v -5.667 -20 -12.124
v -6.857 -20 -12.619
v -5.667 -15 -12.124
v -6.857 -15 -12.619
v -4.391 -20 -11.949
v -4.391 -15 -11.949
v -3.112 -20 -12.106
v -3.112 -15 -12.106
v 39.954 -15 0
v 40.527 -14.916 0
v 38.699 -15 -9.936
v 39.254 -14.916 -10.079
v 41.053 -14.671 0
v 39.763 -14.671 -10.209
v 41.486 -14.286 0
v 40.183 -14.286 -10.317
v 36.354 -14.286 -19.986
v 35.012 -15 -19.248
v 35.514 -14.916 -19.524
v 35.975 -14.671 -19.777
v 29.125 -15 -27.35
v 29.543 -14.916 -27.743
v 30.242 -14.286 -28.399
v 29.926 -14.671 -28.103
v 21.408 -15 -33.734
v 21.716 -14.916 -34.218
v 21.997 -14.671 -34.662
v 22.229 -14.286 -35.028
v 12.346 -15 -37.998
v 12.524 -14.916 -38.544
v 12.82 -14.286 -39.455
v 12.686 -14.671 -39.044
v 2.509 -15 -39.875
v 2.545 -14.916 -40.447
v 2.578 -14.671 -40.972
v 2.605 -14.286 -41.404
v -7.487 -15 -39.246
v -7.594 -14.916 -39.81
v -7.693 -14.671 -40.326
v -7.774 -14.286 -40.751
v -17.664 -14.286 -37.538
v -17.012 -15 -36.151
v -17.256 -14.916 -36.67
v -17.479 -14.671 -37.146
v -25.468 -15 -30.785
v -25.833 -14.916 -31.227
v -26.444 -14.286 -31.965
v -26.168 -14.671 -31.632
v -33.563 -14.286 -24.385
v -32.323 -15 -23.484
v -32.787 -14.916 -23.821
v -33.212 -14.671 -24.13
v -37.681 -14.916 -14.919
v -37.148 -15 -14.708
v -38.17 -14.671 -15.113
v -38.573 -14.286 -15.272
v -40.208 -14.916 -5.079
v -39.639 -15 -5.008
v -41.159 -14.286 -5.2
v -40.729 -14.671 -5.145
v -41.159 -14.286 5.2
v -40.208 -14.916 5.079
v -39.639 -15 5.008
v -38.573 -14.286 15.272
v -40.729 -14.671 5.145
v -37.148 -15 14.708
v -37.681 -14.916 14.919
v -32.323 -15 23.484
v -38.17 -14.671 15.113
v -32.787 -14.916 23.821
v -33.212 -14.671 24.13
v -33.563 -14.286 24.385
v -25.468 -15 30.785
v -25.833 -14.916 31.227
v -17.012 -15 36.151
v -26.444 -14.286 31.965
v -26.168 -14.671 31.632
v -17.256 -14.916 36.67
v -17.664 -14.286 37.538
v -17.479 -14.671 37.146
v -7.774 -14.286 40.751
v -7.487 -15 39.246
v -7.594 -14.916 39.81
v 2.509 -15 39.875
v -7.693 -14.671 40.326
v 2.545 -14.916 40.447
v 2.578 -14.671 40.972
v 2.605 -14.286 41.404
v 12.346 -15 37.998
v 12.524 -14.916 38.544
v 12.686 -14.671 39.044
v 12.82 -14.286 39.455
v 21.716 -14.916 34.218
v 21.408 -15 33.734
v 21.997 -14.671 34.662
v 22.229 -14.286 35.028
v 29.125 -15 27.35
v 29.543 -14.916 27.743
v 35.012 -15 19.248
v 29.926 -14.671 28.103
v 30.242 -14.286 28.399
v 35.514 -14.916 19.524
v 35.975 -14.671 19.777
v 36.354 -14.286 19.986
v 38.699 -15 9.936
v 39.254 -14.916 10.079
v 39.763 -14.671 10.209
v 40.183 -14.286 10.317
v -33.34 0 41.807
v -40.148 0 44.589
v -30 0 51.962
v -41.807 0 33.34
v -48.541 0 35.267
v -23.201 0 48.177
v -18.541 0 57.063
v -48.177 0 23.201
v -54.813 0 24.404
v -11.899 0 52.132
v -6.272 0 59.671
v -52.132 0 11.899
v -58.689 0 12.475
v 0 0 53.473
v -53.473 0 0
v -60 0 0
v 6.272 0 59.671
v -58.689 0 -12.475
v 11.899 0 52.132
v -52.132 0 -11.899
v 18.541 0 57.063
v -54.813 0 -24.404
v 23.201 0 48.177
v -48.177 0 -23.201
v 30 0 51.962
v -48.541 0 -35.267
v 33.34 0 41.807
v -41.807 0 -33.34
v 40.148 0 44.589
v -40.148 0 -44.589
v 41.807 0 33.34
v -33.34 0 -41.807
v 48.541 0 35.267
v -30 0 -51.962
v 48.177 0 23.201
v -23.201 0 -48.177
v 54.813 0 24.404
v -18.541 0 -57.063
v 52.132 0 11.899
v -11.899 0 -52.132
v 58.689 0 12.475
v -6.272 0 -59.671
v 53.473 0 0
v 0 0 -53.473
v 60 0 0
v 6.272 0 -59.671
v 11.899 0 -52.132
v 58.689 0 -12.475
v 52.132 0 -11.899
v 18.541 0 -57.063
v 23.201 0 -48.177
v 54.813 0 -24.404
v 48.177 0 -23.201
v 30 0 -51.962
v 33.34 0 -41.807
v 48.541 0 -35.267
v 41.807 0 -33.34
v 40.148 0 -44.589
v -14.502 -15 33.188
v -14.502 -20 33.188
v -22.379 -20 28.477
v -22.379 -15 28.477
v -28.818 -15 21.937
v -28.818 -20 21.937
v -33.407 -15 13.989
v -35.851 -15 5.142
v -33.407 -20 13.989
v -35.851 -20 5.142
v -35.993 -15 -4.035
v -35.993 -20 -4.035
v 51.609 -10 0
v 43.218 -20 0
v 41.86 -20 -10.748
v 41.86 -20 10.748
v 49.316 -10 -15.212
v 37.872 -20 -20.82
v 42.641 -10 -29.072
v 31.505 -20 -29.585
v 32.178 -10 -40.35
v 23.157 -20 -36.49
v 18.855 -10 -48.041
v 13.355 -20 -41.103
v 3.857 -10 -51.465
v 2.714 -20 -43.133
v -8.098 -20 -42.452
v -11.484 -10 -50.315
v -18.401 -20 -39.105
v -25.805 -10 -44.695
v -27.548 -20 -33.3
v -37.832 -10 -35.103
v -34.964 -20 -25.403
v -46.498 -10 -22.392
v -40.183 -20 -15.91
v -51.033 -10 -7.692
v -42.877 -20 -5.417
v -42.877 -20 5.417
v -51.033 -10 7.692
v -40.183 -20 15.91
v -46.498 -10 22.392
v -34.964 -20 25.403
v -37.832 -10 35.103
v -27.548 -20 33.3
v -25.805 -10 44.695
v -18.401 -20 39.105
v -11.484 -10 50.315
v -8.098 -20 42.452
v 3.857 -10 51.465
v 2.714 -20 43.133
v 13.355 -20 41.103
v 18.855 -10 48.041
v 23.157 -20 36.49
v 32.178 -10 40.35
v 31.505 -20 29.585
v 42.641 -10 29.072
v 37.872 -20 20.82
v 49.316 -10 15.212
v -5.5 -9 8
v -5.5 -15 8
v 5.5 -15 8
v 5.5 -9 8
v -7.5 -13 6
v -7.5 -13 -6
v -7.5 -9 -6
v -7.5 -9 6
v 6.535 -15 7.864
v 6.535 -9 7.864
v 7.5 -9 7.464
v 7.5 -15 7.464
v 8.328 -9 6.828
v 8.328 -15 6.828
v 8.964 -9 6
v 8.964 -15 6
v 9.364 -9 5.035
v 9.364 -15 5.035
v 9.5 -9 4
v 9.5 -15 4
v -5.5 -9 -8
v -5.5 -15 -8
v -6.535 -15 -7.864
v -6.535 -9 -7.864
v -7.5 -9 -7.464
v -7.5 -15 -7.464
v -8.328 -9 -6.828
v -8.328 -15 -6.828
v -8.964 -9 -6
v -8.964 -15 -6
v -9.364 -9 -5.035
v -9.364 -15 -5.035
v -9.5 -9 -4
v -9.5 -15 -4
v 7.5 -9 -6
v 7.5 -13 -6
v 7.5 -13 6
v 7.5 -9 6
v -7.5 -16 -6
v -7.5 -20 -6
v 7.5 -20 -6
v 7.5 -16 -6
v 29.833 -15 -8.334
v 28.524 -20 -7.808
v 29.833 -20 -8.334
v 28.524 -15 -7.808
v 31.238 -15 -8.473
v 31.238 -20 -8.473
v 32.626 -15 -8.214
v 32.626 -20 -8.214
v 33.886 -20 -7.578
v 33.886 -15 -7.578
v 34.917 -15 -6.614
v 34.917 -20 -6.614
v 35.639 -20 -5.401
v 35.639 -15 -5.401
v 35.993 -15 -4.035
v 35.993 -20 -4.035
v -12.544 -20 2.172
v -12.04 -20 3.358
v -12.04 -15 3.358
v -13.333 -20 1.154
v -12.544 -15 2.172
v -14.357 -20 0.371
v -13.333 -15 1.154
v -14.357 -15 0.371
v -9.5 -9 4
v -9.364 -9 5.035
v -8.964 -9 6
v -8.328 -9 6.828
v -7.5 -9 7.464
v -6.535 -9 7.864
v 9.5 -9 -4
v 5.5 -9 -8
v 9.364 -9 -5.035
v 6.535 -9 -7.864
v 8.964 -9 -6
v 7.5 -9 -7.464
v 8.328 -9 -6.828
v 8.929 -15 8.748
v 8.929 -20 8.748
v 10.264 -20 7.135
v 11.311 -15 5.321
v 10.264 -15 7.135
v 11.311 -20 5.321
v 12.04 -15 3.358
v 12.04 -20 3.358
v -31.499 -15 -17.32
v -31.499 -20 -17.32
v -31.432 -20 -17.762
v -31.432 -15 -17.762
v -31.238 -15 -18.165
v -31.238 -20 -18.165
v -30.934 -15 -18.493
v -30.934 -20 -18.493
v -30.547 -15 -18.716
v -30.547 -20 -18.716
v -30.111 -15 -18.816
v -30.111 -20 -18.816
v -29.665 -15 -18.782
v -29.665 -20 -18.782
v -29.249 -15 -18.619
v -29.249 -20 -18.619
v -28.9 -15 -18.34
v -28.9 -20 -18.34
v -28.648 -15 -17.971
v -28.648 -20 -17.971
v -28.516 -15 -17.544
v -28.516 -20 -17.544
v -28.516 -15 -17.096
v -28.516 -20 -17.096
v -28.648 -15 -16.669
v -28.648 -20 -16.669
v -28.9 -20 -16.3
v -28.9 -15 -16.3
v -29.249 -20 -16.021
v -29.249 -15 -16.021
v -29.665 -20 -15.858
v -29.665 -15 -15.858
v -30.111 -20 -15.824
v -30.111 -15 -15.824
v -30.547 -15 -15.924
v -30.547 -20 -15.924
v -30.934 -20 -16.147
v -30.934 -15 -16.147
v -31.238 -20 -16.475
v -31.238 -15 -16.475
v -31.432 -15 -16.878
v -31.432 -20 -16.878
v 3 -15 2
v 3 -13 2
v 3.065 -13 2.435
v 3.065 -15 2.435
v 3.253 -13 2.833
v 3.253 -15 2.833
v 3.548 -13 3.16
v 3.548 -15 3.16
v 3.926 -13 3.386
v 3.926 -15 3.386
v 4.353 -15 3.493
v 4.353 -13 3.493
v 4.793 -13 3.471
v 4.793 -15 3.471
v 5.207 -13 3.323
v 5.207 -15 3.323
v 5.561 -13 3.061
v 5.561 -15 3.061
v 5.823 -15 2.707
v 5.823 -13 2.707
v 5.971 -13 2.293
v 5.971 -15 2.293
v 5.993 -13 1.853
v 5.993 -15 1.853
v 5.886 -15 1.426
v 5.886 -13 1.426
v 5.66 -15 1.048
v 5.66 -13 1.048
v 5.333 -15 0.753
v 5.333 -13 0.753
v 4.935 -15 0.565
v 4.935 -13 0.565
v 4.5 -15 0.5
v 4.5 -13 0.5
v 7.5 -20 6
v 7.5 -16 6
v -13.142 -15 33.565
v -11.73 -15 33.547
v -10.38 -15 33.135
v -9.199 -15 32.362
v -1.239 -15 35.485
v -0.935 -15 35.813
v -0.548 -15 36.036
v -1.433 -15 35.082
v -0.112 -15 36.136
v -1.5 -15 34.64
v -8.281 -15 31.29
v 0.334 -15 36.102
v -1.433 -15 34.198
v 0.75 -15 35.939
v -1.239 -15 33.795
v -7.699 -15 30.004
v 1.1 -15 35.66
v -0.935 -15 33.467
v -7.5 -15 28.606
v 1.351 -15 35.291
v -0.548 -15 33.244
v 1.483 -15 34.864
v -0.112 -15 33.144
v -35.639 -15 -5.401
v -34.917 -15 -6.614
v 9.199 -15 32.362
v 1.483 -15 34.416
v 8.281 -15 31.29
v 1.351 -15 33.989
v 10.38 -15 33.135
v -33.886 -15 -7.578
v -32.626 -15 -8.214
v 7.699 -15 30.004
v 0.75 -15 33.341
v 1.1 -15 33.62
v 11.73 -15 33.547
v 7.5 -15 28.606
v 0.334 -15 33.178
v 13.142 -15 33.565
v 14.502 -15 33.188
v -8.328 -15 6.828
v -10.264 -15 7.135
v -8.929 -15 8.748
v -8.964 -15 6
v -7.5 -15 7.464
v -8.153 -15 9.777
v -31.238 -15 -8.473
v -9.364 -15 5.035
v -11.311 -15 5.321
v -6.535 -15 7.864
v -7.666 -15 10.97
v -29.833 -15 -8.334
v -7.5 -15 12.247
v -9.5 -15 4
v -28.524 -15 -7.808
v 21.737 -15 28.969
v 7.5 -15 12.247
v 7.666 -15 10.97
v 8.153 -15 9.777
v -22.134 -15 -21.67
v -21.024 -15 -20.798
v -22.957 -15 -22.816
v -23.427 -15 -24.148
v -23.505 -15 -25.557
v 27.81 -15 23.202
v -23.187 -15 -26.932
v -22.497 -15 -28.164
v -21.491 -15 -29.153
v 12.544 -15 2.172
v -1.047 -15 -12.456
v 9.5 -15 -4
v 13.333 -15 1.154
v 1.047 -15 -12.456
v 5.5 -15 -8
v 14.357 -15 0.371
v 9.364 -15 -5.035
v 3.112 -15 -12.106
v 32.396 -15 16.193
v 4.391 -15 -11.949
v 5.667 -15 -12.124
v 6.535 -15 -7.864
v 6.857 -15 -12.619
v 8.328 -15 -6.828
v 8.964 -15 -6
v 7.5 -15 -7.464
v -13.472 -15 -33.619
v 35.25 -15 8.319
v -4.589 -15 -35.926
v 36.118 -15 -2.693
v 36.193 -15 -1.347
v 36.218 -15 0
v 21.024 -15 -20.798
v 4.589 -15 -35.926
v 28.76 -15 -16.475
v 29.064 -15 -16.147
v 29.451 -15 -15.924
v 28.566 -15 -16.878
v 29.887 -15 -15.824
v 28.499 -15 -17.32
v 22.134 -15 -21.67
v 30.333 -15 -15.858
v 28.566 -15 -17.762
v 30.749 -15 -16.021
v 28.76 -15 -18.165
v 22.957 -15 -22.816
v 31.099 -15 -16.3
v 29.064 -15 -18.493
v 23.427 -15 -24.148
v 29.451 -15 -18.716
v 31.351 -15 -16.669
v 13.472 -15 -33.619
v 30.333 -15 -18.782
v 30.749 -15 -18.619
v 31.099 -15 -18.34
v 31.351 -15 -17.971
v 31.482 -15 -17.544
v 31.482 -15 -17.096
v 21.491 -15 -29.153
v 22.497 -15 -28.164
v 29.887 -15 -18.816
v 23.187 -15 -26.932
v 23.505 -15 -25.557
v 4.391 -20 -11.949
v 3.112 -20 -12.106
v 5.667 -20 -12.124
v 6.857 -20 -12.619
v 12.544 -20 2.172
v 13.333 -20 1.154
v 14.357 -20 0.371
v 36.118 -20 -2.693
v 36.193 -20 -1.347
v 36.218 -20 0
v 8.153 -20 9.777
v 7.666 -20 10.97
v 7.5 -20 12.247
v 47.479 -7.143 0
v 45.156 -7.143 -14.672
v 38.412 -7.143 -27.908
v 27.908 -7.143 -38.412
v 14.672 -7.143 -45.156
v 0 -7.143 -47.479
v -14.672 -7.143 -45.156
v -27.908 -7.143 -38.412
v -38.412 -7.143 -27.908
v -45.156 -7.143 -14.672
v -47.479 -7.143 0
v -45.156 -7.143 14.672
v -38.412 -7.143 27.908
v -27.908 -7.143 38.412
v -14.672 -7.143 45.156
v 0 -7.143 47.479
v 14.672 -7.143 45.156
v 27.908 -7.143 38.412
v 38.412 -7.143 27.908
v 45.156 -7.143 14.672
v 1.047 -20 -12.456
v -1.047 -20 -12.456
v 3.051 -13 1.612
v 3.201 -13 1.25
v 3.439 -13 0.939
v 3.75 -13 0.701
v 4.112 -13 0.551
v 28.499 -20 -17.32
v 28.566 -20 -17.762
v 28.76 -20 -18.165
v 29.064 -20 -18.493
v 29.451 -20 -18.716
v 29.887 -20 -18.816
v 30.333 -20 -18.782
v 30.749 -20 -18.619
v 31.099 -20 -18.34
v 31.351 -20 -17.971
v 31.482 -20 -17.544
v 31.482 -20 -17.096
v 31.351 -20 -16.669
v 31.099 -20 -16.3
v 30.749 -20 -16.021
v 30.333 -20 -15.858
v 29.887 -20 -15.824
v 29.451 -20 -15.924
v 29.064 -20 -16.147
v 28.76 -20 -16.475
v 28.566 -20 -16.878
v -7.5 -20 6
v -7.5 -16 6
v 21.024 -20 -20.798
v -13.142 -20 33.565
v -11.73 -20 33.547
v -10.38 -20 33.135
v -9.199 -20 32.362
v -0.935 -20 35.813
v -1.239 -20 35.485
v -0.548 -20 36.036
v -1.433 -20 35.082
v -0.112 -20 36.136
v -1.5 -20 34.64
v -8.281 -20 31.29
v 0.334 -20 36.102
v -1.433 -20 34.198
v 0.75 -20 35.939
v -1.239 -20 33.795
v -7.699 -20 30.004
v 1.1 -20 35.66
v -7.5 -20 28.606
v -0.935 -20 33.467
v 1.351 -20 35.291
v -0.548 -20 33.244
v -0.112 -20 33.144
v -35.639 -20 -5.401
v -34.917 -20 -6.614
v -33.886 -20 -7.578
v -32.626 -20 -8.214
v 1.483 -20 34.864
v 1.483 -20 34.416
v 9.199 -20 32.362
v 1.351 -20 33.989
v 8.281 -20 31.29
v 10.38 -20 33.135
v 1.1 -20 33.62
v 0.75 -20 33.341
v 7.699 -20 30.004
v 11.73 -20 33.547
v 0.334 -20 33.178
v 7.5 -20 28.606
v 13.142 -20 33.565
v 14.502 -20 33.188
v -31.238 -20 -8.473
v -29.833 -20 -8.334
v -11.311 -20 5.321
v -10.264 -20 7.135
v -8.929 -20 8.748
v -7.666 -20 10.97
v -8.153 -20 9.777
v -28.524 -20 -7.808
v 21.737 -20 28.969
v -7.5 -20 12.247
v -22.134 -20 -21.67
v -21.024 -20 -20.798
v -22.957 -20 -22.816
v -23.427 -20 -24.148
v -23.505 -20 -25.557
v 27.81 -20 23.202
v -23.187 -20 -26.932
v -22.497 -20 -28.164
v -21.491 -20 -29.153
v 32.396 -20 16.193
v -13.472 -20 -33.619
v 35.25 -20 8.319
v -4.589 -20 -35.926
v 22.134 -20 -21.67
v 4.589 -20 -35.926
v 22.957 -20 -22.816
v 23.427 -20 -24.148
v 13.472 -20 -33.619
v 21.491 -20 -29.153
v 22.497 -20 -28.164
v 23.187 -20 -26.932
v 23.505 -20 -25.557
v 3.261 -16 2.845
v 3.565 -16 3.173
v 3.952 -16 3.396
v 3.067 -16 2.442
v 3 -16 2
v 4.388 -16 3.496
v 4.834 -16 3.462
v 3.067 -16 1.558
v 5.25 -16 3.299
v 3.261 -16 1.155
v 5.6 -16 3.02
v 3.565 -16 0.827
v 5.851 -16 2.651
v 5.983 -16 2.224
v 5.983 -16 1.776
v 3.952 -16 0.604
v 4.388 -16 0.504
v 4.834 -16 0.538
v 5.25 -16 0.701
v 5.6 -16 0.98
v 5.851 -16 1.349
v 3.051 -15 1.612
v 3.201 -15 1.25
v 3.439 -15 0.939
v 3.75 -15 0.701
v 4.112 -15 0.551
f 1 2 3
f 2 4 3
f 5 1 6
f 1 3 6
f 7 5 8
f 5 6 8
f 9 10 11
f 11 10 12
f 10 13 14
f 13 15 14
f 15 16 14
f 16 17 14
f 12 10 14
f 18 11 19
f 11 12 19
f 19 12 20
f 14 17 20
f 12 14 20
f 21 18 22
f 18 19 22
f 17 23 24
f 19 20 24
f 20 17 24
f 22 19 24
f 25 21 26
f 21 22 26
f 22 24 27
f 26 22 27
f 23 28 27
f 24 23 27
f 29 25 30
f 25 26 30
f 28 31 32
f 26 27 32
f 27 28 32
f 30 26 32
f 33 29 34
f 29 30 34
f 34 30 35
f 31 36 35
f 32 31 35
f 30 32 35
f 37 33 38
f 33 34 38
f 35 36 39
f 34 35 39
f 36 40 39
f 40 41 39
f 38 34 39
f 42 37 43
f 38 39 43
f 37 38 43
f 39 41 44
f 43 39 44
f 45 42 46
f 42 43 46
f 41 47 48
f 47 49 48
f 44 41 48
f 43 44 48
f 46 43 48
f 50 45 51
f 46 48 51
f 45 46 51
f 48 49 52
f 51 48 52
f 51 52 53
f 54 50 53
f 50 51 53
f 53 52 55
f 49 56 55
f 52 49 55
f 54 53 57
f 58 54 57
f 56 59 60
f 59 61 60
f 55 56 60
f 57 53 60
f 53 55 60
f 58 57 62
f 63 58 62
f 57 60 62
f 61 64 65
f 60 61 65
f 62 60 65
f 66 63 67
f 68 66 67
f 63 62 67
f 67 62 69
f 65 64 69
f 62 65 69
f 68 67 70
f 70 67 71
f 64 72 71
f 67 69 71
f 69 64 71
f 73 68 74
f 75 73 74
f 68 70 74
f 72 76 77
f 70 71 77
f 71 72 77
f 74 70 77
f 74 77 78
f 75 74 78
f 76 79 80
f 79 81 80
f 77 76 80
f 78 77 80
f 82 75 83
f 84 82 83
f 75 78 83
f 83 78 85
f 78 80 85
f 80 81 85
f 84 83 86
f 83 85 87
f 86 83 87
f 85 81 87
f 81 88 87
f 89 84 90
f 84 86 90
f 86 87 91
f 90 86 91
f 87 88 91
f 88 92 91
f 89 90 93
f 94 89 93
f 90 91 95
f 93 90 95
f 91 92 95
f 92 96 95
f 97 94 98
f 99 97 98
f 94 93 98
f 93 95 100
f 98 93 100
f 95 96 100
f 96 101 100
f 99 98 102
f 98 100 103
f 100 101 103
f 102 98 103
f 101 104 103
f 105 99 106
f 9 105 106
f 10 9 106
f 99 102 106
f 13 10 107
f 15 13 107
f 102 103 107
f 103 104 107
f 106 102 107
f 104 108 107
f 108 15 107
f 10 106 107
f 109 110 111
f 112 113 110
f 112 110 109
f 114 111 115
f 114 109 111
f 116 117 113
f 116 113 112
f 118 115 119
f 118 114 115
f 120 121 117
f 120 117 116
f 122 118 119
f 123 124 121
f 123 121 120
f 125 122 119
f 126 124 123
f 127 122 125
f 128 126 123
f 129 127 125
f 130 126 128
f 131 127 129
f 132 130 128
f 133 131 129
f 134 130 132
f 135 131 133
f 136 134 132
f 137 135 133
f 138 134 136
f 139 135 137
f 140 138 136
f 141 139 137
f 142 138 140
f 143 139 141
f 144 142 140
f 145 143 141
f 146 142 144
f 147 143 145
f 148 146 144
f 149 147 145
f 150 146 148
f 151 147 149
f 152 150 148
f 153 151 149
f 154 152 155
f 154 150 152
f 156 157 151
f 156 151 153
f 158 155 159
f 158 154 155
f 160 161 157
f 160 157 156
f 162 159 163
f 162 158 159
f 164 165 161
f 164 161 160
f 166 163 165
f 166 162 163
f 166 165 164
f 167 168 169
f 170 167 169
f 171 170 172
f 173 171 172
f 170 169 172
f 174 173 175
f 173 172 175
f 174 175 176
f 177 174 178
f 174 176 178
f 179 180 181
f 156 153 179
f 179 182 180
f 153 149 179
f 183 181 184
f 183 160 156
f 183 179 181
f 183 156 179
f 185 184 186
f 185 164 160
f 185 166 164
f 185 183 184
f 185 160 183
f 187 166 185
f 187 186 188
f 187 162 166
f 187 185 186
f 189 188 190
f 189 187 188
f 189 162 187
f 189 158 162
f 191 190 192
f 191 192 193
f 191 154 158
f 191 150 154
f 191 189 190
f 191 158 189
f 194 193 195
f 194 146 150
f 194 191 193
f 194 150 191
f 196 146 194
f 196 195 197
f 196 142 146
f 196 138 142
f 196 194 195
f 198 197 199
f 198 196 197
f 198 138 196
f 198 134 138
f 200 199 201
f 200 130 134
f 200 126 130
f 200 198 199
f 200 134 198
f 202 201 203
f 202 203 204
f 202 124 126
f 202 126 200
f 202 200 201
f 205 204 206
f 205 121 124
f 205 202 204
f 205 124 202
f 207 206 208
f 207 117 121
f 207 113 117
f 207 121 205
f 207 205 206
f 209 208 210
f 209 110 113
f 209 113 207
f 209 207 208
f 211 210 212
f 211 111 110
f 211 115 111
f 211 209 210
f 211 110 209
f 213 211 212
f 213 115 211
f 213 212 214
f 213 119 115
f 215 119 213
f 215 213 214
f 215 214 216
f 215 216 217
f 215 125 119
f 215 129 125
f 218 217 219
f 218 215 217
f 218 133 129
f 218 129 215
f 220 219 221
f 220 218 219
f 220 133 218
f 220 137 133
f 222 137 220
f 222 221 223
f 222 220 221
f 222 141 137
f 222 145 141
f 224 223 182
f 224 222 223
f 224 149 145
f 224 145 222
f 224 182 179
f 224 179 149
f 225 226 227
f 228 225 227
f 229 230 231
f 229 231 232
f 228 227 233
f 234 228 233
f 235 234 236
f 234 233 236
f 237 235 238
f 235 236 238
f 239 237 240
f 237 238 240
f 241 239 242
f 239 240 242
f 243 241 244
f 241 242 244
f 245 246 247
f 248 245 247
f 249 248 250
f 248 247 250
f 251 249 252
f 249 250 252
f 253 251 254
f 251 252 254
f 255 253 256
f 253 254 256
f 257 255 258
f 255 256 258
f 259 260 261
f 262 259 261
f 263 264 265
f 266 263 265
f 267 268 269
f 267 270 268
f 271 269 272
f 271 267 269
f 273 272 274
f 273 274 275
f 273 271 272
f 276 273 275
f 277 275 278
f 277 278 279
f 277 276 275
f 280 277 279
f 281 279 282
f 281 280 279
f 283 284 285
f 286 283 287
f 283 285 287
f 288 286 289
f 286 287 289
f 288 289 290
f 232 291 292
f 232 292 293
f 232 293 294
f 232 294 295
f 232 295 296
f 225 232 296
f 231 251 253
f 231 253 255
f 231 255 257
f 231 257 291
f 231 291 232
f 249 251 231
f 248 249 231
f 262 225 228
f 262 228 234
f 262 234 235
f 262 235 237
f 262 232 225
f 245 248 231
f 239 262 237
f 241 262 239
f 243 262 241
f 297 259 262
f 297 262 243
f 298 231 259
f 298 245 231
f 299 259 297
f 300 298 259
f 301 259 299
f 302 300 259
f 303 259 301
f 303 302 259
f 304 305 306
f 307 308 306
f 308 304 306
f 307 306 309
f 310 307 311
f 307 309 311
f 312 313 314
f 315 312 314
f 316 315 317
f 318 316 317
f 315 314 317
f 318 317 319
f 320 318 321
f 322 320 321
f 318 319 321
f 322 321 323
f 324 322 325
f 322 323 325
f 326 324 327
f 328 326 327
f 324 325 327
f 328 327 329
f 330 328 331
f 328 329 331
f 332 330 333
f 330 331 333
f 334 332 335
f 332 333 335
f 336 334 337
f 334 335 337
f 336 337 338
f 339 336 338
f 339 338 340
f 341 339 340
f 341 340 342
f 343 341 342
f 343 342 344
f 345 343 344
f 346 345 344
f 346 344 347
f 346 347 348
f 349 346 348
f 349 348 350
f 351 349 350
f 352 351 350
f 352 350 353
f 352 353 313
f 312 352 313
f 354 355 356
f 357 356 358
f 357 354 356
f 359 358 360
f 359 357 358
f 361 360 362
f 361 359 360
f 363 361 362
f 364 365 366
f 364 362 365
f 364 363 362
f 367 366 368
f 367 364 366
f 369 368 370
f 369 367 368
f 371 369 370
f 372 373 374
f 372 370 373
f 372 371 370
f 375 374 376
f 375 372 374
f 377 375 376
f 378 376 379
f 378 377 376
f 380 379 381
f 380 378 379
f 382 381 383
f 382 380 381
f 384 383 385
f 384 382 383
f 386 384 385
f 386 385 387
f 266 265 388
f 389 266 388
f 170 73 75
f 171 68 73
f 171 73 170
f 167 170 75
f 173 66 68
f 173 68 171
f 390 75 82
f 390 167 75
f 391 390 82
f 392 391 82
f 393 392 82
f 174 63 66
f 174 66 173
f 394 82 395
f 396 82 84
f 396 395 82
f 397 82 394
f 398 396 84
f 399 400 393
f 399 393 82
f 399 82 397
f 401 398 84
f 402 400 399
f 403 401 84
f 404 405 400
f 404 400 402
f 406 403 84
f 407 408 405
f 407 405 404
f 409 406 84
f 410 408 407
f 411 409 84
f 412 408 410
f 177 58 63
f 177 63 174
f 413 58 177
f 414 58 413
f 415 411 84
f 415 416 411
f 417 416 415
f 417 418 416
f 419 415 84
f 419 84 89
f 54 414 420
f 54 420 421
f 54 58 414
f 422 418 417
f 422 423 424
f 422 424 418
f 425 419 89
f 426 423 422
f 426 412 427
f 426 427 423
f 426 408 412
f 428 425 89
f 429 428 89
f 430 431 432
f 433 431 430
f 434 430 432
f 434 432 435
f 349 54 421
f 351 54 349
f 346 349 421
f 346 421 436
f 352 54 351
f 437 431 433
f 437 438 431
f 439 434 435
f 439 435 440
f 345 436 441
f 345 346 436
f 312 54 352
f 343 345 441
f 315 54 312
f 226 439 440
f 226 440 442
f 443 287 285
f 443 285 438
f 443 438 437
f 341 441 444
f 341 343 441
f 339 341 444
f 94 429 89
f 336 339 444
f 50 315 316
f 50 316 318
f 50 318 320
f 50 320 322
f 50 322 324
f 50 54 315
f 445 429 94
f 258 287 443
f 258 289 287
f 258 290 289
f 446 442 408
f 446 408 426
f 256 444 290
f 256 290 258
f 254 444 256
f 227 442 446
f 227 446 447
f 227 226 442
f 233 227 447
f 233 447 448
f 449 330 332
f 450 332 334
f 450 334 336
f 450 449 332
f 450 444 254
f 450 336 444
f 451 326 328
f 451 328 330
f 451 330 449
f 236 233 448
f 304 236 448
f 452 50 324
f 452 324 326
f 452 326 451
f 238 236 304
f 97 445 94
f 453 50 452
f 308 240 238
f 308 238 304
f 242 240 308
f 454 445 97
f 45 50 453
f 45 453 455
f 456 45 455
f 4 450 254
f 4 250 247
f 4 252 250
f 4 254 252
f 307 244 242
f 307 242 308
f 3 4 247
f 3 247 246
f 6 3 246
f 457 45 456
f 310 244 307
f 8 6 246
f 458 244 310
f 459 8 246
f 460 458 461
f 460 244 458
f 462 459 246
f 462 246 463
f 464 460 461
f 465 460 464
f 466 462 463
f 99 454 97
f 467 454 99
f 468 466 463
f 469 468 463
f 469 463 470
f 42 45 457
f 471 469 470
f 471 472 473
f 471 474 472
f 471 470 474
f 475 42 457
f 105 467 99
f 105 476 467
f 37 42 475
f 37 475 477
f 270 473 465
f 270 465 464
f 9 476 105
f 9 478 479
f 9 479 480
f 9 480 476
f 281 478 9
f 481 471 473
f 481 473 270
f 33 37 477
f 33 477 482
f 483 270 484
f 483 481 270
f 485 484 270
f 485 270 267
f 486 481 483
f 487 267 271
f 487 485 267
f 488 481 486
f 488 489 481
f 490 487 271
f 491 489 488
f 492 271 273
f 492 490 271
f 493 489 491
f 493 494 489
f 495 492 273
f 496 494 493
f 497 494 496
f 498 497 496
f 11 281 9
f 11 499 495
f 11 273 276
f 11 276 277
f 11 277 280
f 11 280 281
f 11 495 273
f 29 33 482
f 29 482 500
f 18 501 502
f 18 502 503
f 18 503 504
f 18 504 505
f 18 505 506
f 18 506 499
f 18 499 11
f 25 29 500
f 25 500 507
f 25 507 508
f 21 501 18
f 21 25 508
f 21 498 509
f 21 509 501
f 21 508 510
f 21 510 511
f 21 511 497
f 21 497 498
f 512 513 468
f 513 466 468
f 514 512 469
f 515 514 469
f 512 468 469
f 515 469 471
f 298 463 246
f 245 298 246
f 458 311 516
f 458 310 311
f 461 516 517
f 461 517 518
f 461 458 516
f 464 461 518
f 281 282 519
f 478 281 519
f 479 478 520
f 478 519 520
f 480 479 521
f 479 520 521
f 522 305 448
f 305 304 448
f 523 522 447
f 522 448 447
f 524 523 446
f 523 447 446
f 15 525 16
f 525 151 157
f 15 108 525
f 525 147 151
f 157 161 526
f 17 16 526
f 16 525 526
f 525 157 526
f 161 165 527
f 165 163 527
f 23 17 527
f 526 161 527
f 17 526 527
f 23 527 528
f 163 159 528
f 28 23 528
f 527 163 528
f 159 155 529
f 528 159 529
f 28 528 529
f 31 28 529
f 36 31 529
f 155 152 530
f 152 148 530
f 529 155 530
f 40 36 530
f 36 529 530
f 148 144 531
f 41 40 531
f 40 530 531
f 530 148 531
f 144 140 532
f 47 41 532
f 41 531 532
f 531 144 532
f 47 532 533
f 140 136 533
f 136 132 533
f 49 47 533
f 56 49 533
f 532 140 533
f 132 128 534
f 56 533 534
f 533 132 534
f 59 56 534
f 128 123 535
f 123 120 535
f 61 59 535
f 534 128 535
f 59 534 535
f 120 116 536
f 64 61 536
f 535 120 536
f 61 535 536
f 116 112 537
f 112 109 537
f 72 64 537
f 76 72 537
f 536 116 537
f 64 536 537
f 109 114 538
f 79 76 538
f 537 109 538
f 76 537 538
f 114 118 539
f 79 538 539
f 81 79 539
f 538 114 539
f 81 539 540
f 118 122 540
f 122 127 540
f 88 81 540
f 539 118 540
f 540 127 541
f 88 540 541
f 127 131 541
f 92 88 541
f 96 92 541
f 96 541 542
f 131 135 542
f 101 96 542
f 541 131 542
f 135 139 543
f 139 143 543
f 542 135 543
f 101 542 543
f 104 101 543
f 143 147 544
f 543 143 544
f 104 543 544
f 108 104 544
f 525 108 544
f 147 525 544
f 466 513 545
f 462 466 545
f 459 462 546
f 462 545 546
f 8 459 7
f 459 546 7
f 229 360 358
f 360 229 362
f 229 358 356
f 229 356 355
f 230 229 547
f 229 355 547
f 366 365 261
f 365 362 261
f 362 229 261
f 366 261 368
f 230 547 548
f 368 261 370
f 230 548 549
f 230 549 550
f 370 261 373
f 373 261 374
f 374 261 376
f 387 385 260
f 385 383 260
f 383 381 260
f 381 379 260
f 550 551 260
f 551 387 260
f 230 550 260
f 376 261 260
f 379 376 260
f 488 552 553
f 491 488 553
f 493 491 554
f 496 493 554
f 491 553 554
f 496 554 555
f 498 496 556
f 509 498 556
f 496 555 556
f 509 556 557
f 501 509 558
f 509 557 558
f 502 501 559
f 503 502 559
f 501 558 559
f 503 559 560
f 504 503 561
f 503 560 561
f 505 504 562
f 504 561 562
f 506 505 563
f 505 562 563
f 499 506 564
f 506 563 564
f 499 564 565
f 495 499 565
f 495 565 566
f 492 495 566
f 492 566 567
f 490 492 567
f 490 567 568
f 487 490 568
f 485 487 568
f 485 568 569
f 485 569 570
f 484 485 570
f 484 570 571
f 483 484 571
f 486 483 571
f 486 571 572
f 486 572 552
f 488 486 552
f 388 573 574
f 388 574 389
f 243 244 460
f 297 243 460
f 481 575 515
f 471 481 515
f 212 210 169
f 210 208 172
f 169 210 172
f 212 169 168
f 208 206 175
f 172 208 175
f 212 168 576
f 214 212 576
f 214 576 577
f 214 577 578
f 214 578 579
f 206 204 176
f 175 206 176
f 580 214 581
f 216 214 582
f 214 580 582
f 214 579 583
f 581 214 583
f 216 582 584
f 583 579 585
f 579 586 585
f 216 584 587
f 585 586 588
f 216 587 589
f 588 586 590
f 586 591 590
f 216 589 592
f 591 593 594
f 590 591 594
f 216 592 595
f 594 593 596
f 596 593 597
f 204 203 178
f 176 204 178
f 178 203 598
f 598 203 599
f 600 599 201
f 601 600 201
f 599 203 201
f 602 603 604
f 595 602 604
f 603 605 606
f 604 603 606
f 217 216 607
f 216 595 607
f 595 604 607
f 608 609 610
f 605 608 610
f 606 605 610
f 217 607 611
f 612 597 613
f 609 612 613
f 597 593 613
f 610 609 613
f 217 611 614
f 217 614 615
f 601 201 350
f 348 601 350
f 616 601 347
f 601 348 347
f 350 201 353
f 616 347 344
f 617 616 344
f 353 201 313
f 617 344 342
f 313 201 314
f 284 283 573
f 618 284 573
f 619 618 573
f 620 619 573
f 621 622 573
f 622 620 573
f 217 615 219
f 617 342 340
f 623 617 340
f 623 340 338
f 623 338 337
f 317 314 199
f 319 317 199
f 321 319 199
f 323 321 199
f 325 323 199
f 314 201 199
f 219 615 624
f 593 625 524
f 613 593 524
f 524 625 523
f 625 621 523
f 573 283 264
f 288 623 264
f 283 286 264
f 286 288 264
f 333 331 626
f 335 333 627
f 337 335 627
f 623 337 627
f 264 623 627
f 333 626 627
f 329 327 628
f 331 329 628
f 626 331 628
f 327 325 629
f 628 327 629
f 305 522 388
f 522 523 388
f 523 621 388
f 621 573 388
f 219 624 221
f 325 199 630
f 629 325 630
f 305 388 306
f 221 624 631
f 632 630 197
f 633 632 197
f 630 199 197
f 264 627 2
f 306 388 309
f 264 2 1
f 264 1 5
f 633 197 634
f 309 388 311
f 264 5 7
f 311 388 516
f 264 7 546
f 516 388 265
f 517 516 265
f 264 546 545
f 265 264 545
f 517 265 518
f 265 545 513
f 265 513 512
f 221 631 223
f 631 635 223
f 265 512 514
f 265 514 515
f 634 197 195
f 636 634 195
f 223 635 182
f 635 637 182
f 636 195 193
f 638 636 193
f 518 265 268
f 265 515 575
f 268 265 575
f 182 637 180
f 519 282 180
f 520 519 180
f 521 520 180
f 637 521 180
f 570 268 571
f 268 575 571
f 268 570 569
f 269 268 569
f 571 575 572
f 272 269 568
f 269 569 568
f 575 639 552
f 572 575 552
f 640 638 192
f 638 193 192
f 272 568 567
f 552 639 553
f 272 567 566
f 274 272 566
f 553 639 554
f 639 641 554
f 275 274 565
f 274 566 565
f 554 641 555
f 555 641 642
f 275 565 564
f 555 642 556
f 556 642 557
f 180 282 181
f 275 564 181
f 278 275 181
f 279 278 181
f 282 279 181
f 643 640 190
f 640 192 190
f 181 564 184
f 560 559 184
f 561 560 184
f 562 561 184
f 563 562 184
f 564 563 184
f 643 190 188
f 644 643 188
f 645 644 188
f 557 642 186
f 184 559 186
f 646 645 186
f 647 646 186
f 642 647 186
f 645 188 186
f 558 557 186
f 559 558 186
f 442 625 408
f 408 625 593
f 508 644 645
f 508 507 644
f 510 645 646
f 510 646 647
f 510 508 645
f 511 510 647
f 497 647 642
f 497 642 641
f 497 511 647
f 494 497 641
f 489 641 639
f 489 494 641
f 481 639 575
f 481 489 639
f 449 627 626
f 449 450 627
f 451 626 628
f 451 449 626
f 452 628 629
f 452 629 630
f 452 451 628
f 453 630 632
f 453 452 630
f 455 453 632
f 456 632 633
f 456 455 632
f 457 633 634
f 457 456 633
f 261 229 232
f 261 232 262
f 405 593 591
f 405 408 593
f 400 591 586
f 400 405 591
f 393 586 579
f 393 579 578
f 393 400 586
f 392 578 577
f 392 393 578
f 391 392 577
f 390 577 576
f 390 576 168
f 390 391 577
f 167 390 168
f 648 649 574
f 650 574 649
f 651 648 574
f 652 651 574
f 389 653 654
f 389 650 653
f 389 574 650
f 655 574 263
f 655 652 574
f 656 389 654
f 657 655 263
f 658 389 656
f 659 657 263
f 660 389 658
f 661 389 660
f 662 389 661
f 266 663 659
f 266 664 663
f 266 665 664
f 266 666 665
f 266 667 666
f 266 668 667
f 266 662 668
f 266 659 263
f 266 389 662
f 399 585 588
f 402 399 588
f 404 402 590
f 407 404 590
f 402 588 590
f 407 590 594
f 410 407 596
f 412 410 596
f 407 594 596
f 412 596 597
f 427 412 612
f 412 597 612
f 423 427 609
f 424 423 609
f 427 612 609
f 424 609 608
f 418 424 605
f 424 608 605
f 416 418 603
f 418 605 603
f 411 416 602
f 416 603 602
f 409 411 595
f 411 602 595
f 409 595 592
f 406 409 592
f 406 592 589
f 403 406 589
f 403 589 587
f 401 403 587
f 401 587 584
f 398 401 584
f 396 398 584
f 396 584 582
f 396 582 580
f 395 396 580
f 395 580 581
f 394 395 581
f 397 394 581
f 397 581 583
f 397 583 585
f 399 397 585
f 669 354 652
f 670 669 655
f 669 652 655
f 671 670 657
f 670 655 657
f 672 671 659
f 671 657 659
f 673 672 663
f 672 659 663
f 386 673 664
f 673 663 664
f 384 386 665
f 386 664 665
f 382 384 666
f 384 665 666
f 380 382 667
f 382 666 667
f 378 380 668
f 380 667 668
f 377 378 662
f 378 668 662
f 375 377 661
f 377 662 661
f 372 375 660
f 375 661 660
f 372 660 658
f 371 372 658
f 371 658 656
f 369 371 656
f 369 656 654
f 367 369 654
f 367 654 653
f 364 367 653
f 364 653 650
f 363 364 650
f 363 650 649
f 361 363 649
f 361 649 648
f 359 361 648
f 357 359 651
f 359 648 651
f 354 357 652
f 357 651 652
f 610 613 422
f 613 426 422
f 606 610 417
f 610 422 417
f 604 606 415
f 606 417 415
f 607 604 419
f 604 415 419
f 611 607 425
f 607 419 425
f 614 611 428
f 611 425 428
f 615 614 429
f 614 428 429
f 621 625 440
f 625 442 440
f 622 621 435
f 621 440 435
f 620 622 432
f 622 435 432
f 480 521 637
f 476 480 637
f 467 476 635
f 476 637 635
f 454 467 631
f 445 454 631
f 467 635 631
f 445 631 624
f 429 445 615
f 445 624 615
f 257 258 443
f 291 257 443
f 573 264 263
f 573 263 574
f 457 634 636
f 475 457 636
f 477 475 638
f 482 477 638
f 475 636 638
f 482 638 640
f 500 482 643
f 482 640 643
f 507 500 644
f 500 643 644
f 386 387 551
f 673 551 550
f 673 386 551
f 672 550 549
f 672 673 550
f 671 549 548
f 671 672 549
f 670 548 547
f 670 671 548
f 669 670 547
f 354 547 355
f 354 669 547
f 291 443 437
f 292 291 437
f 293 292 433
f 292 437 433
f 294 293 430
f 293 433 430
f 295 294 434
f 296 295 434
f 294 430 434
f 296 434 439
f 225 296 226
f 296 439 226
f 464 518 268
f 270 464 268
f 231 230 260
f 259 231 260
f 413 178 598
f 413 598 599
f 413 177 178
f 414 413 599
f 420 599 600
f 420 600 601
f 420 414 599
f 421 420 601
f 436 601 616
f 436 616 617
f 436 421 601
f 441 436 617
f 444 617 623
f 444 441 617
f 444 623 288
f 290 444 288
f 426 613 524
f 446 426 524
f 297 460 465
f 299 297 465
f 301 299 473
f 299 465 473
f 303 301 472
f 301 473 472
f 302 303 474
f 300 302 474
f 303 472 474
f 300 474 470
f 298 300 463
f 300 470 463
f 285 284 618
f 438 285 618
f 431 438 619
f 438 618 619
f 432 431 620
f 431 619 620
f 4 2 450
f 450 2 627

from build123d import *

# Parameters (mm, degrees)
SKETCH1_R                 = 60
BOSS_EXTRUDE1_DEPTH       = 20
BOSS_EXTRUDE1_DRAFT       = -40
SHELL1_T                  = -5
CUT_EXTRUDE2_DEPTH        = 20
SKETCH3_W                 = 15
SKETCH3_H                 = 12
BOSS_EXTRUDE2_DEPTH       = 6
F_3_0MM_DOWEL_HOLE1_D     = 3
FILLET1_R                 = 5
FILLET2_R                 = 2
SKETCH10_W                = 15
SKETCH10_H                = 12
CUT_EXTRUDE3_DEPTH        = 5
SKETCH12_W                = 12
SKETCH12_H                = 3
BOSS_EXTRUDE5_DEPTH       = 7.5
F_3_0MM_DOWEL_HOLE3_D     = 3
F_3_0MM_DOWEL_HOLE3_DEPTH = 15
F_3_0MM_DOWEL_HOLE3_TIP   = 0.901290929


with BuildPart() as part:
    # Sketch1 → Boss-Extrude1 (with draft: the straight prism first)
    with BuildSketch(Plane(origin=(0, 0, 0), x_dir=(1, 0, 0), z_dir=(0, 1, 0))):
        Circle(SKETCH1_R)
    extrude(amount=-BOSS_EXTRUDE1_DEPTH)
    # Boss-Extrude1: the draft: its side faces are tilted about the plane it starts from
    boss_extrude1_sides = [part.faces().sort_by_distance(p)[0] for p in [
        (-60, -10, 0),
    ]]
    draft(boss_extrude1_sides, Plane(origin=(0, 0, 0), x_dir=(1, 0, 0), z_dir=(0, 1, 0)), BOSS_EXTRUDE1_DRAFT)

    # Shell1
    shell1_openings = [part.faces().sort_by_distance(p)[0] for p in [
        (0, 0, 0),
    ]]
    offset(amount=SHELL1_T, openings=shell1_openings, kind=Kind.INTERSECTION)

    # Sketch2 → Cut-Extrude2 (cut)
    with BuildSketch(Plane.XZ.offset(20)):
        with BuildLine():
            ThreePointArc((-7.5, 35.432951589), (-31.365714462, 18.109003688), (-34.435836207, -11.221285266))
            Line((-34.435836207, -11.221285266), (-12.410254038, 1.495190528))
            ThreePointArc((-12.410254038, 1.495190528), (-10.825317547, 6.25), (-7.5, 10))
            Line((-7.5, 10), (-7.5, 35.432951589))
        make_face()
        with BuildLine():
            Line((12.410254038, 1.495190528), (34.435836207, -11.221285266))
            ThreePointArc((34.435836207, -11.221285266), (35.769689879, -5.680963323), (36.218007376, 0))
            ThreePointArc((36.218007376, 0), (28.136978459, 22.804703495), (7.5, 35.432951589))
            Line((7.5, 35.432951589), (7.5, 10))
            ThreePointArc((7.5, 10), (10.825317547, 6.25), (12.410254038, 1.495190528))
        make_face()
        with BuildLine():
            ThreePointArc((-26.935836207, -24.211666323), (0, -36.218007376), (26.935836207, -24.211666323))
            Line((26.935836207, -24.211666323), (4.910254038, -11.495190528))
            ThreePointArc((4.910254038, -11.495190528), (0, -12.5), (-4.910254038, -11.495190528))
            Line((-4.910254038, -11.495190528), (-26.935836207, -24.211666323))
        make_face()
    extrude(amount=-CUT_EXTRUDE2_DEPTH, mode=Mode.SUBTRACT)

    # Sketch3 → Boss-Extrude2 (add)
    with BuildSketch(Plane(origin=(0, -15, 0), x_dir=(1, 0, 0), z_dir=(0, 1, 0))):
        with BuildLine():
            Line((-5.5, -8), (5.5, -8))
            ThreePointArc((5.5, -8), (8.328427125, -6.828427125), (9.5, -4))
            Line((9.5, -4), (9.5, 4))
            ThreePointArc((9.5, 4), (8.328427125, 6.828427125), (5.5, 8))
            Line((5.5, 8), (-5.5, 8))
            ThreePointArc((-5.5, 8), (-8.328427125, 6.828427125), (-9.5, 4))
            Line((-9.5, 4), (-9.5, -4))
            ThreePointArc((-9.5, -4), (-8.328427125, -6.828427125), (-5.5, -8))
        make_face()
        Rectangle(SKETCH3_W, SKETCH3_H, mode=Mode.SUBTRACT)
    extrude(amount=BOSS_EXTRUDE2_DEPTH)

    # Ø3.0mm Dowel Hole1 (through all)
    with Locations(Plane(origin=(0, -15, 0), x_dir=(1, 0, 0), z_dir=(0, 1, 0))):
        with Locations((-29.999119987, 17.32), (29.999119987, 17.32), (0, -34.64)):
            Hole(F_3_0MM_DOWEL_HOLE1_D / 2)

    # Fillet1
    fillet1_edges = [part.edges().sort_by_distance(p)[0] for p in [
        (-26.935836207, -17.5, -24.211666323),
        (-4.910254038, -17.5, -11.495190528),
        (4.910254038, -17.5, -11.495190528),
        (26.935836207, -17.5, -24.211666323),
        (34.435836207, -17.5, -11.221285266),
        (12.410254038, -17.5, 1.495190528),
        (7.5, -17.5, 10),
        (7.5, -17.5, 35.432951589),
        (-7.5, -17.5, 35.432951589),
        (-7.5, -17.5, 10),
        (-12.410254038, -17.5, 1.495190528),
        (-34.435836207, -17.5, -11.221285266),
    ]]
    fillet(fillet1_edges, radius=FILLET1_R)

    # Fillet2
    fillet2_edges = [part.edges().sort_by_distance(p)[0] for p in [
        (-40.886469086, -15, 0),
    ]]
    fillet(fillet2_edges, radius=FILLET2_R)

    # Sketch10 → Cut-Extrude3 (cut)
    with BuildSketch(Plane.XZ.offset(20)):
        Rectangle(SKETCH10_W, SKETCH10_H)
    extrude(amount=-CUT_EXTRUDE3_DEPTH, mode=Mode.SUBTRACT)

    # Sketch12 → Boss-Extrude5 (add, symmetric)
    with BuildSketch(Plane(origin=(0, 0, 0), x_dir=(0, 0, -1), z_dir=(1, 0, 0))):
        with Locations((0, -14.5)):
            Rectangle(SKETCH12_W, SKETCH12_H)
    extrude(amount=BOSS_EXTRUDE5_DEPTH, both=True)

    # Sketch9 → Ø3.0mm Dowel Hole2 (revolve, cut)
    with BuildSketch(Plane(origin=(4.5, -15, 2), x_dir=(0, 0, -1), z_dir=(1, 0, 0))):
        Polygon((0, 0), (0, 15.901290929), (1.5, 15), (1.5, 0), align=None)
    revolve(axis=Axis((4.5, -21.35, 2), (0, 1, 0)), mode=Mode.SUBTRACT)

    # Ø3.0mm Dowel Hole3
    with Locations(Plane(origin=(0, -15, 0), x_dir=(1, 0, 0), z_dir=(0, 1, 0))):
        with Locations((4.5, -2)):
            Hole(F_3_0MM_DOWEL_HOLE3_D / 2, depth=F_3_0MM_DOWEL_HOLE3_DEPTH)
            with Locations((0, 0, -(F_3_0MM_DOWEL_HOLE3_DEPTH + F_3_0MM_DOWEL_HOLE3_TIP / 2))):  # 118° drill point
                Cone(0, F_3_0MM_DOWEL_HOLE3_D / 2, F_3_0MM_DOWEL_HOLE3_TIP, mode=Mode.SUBTRACT)


solid = part.part
